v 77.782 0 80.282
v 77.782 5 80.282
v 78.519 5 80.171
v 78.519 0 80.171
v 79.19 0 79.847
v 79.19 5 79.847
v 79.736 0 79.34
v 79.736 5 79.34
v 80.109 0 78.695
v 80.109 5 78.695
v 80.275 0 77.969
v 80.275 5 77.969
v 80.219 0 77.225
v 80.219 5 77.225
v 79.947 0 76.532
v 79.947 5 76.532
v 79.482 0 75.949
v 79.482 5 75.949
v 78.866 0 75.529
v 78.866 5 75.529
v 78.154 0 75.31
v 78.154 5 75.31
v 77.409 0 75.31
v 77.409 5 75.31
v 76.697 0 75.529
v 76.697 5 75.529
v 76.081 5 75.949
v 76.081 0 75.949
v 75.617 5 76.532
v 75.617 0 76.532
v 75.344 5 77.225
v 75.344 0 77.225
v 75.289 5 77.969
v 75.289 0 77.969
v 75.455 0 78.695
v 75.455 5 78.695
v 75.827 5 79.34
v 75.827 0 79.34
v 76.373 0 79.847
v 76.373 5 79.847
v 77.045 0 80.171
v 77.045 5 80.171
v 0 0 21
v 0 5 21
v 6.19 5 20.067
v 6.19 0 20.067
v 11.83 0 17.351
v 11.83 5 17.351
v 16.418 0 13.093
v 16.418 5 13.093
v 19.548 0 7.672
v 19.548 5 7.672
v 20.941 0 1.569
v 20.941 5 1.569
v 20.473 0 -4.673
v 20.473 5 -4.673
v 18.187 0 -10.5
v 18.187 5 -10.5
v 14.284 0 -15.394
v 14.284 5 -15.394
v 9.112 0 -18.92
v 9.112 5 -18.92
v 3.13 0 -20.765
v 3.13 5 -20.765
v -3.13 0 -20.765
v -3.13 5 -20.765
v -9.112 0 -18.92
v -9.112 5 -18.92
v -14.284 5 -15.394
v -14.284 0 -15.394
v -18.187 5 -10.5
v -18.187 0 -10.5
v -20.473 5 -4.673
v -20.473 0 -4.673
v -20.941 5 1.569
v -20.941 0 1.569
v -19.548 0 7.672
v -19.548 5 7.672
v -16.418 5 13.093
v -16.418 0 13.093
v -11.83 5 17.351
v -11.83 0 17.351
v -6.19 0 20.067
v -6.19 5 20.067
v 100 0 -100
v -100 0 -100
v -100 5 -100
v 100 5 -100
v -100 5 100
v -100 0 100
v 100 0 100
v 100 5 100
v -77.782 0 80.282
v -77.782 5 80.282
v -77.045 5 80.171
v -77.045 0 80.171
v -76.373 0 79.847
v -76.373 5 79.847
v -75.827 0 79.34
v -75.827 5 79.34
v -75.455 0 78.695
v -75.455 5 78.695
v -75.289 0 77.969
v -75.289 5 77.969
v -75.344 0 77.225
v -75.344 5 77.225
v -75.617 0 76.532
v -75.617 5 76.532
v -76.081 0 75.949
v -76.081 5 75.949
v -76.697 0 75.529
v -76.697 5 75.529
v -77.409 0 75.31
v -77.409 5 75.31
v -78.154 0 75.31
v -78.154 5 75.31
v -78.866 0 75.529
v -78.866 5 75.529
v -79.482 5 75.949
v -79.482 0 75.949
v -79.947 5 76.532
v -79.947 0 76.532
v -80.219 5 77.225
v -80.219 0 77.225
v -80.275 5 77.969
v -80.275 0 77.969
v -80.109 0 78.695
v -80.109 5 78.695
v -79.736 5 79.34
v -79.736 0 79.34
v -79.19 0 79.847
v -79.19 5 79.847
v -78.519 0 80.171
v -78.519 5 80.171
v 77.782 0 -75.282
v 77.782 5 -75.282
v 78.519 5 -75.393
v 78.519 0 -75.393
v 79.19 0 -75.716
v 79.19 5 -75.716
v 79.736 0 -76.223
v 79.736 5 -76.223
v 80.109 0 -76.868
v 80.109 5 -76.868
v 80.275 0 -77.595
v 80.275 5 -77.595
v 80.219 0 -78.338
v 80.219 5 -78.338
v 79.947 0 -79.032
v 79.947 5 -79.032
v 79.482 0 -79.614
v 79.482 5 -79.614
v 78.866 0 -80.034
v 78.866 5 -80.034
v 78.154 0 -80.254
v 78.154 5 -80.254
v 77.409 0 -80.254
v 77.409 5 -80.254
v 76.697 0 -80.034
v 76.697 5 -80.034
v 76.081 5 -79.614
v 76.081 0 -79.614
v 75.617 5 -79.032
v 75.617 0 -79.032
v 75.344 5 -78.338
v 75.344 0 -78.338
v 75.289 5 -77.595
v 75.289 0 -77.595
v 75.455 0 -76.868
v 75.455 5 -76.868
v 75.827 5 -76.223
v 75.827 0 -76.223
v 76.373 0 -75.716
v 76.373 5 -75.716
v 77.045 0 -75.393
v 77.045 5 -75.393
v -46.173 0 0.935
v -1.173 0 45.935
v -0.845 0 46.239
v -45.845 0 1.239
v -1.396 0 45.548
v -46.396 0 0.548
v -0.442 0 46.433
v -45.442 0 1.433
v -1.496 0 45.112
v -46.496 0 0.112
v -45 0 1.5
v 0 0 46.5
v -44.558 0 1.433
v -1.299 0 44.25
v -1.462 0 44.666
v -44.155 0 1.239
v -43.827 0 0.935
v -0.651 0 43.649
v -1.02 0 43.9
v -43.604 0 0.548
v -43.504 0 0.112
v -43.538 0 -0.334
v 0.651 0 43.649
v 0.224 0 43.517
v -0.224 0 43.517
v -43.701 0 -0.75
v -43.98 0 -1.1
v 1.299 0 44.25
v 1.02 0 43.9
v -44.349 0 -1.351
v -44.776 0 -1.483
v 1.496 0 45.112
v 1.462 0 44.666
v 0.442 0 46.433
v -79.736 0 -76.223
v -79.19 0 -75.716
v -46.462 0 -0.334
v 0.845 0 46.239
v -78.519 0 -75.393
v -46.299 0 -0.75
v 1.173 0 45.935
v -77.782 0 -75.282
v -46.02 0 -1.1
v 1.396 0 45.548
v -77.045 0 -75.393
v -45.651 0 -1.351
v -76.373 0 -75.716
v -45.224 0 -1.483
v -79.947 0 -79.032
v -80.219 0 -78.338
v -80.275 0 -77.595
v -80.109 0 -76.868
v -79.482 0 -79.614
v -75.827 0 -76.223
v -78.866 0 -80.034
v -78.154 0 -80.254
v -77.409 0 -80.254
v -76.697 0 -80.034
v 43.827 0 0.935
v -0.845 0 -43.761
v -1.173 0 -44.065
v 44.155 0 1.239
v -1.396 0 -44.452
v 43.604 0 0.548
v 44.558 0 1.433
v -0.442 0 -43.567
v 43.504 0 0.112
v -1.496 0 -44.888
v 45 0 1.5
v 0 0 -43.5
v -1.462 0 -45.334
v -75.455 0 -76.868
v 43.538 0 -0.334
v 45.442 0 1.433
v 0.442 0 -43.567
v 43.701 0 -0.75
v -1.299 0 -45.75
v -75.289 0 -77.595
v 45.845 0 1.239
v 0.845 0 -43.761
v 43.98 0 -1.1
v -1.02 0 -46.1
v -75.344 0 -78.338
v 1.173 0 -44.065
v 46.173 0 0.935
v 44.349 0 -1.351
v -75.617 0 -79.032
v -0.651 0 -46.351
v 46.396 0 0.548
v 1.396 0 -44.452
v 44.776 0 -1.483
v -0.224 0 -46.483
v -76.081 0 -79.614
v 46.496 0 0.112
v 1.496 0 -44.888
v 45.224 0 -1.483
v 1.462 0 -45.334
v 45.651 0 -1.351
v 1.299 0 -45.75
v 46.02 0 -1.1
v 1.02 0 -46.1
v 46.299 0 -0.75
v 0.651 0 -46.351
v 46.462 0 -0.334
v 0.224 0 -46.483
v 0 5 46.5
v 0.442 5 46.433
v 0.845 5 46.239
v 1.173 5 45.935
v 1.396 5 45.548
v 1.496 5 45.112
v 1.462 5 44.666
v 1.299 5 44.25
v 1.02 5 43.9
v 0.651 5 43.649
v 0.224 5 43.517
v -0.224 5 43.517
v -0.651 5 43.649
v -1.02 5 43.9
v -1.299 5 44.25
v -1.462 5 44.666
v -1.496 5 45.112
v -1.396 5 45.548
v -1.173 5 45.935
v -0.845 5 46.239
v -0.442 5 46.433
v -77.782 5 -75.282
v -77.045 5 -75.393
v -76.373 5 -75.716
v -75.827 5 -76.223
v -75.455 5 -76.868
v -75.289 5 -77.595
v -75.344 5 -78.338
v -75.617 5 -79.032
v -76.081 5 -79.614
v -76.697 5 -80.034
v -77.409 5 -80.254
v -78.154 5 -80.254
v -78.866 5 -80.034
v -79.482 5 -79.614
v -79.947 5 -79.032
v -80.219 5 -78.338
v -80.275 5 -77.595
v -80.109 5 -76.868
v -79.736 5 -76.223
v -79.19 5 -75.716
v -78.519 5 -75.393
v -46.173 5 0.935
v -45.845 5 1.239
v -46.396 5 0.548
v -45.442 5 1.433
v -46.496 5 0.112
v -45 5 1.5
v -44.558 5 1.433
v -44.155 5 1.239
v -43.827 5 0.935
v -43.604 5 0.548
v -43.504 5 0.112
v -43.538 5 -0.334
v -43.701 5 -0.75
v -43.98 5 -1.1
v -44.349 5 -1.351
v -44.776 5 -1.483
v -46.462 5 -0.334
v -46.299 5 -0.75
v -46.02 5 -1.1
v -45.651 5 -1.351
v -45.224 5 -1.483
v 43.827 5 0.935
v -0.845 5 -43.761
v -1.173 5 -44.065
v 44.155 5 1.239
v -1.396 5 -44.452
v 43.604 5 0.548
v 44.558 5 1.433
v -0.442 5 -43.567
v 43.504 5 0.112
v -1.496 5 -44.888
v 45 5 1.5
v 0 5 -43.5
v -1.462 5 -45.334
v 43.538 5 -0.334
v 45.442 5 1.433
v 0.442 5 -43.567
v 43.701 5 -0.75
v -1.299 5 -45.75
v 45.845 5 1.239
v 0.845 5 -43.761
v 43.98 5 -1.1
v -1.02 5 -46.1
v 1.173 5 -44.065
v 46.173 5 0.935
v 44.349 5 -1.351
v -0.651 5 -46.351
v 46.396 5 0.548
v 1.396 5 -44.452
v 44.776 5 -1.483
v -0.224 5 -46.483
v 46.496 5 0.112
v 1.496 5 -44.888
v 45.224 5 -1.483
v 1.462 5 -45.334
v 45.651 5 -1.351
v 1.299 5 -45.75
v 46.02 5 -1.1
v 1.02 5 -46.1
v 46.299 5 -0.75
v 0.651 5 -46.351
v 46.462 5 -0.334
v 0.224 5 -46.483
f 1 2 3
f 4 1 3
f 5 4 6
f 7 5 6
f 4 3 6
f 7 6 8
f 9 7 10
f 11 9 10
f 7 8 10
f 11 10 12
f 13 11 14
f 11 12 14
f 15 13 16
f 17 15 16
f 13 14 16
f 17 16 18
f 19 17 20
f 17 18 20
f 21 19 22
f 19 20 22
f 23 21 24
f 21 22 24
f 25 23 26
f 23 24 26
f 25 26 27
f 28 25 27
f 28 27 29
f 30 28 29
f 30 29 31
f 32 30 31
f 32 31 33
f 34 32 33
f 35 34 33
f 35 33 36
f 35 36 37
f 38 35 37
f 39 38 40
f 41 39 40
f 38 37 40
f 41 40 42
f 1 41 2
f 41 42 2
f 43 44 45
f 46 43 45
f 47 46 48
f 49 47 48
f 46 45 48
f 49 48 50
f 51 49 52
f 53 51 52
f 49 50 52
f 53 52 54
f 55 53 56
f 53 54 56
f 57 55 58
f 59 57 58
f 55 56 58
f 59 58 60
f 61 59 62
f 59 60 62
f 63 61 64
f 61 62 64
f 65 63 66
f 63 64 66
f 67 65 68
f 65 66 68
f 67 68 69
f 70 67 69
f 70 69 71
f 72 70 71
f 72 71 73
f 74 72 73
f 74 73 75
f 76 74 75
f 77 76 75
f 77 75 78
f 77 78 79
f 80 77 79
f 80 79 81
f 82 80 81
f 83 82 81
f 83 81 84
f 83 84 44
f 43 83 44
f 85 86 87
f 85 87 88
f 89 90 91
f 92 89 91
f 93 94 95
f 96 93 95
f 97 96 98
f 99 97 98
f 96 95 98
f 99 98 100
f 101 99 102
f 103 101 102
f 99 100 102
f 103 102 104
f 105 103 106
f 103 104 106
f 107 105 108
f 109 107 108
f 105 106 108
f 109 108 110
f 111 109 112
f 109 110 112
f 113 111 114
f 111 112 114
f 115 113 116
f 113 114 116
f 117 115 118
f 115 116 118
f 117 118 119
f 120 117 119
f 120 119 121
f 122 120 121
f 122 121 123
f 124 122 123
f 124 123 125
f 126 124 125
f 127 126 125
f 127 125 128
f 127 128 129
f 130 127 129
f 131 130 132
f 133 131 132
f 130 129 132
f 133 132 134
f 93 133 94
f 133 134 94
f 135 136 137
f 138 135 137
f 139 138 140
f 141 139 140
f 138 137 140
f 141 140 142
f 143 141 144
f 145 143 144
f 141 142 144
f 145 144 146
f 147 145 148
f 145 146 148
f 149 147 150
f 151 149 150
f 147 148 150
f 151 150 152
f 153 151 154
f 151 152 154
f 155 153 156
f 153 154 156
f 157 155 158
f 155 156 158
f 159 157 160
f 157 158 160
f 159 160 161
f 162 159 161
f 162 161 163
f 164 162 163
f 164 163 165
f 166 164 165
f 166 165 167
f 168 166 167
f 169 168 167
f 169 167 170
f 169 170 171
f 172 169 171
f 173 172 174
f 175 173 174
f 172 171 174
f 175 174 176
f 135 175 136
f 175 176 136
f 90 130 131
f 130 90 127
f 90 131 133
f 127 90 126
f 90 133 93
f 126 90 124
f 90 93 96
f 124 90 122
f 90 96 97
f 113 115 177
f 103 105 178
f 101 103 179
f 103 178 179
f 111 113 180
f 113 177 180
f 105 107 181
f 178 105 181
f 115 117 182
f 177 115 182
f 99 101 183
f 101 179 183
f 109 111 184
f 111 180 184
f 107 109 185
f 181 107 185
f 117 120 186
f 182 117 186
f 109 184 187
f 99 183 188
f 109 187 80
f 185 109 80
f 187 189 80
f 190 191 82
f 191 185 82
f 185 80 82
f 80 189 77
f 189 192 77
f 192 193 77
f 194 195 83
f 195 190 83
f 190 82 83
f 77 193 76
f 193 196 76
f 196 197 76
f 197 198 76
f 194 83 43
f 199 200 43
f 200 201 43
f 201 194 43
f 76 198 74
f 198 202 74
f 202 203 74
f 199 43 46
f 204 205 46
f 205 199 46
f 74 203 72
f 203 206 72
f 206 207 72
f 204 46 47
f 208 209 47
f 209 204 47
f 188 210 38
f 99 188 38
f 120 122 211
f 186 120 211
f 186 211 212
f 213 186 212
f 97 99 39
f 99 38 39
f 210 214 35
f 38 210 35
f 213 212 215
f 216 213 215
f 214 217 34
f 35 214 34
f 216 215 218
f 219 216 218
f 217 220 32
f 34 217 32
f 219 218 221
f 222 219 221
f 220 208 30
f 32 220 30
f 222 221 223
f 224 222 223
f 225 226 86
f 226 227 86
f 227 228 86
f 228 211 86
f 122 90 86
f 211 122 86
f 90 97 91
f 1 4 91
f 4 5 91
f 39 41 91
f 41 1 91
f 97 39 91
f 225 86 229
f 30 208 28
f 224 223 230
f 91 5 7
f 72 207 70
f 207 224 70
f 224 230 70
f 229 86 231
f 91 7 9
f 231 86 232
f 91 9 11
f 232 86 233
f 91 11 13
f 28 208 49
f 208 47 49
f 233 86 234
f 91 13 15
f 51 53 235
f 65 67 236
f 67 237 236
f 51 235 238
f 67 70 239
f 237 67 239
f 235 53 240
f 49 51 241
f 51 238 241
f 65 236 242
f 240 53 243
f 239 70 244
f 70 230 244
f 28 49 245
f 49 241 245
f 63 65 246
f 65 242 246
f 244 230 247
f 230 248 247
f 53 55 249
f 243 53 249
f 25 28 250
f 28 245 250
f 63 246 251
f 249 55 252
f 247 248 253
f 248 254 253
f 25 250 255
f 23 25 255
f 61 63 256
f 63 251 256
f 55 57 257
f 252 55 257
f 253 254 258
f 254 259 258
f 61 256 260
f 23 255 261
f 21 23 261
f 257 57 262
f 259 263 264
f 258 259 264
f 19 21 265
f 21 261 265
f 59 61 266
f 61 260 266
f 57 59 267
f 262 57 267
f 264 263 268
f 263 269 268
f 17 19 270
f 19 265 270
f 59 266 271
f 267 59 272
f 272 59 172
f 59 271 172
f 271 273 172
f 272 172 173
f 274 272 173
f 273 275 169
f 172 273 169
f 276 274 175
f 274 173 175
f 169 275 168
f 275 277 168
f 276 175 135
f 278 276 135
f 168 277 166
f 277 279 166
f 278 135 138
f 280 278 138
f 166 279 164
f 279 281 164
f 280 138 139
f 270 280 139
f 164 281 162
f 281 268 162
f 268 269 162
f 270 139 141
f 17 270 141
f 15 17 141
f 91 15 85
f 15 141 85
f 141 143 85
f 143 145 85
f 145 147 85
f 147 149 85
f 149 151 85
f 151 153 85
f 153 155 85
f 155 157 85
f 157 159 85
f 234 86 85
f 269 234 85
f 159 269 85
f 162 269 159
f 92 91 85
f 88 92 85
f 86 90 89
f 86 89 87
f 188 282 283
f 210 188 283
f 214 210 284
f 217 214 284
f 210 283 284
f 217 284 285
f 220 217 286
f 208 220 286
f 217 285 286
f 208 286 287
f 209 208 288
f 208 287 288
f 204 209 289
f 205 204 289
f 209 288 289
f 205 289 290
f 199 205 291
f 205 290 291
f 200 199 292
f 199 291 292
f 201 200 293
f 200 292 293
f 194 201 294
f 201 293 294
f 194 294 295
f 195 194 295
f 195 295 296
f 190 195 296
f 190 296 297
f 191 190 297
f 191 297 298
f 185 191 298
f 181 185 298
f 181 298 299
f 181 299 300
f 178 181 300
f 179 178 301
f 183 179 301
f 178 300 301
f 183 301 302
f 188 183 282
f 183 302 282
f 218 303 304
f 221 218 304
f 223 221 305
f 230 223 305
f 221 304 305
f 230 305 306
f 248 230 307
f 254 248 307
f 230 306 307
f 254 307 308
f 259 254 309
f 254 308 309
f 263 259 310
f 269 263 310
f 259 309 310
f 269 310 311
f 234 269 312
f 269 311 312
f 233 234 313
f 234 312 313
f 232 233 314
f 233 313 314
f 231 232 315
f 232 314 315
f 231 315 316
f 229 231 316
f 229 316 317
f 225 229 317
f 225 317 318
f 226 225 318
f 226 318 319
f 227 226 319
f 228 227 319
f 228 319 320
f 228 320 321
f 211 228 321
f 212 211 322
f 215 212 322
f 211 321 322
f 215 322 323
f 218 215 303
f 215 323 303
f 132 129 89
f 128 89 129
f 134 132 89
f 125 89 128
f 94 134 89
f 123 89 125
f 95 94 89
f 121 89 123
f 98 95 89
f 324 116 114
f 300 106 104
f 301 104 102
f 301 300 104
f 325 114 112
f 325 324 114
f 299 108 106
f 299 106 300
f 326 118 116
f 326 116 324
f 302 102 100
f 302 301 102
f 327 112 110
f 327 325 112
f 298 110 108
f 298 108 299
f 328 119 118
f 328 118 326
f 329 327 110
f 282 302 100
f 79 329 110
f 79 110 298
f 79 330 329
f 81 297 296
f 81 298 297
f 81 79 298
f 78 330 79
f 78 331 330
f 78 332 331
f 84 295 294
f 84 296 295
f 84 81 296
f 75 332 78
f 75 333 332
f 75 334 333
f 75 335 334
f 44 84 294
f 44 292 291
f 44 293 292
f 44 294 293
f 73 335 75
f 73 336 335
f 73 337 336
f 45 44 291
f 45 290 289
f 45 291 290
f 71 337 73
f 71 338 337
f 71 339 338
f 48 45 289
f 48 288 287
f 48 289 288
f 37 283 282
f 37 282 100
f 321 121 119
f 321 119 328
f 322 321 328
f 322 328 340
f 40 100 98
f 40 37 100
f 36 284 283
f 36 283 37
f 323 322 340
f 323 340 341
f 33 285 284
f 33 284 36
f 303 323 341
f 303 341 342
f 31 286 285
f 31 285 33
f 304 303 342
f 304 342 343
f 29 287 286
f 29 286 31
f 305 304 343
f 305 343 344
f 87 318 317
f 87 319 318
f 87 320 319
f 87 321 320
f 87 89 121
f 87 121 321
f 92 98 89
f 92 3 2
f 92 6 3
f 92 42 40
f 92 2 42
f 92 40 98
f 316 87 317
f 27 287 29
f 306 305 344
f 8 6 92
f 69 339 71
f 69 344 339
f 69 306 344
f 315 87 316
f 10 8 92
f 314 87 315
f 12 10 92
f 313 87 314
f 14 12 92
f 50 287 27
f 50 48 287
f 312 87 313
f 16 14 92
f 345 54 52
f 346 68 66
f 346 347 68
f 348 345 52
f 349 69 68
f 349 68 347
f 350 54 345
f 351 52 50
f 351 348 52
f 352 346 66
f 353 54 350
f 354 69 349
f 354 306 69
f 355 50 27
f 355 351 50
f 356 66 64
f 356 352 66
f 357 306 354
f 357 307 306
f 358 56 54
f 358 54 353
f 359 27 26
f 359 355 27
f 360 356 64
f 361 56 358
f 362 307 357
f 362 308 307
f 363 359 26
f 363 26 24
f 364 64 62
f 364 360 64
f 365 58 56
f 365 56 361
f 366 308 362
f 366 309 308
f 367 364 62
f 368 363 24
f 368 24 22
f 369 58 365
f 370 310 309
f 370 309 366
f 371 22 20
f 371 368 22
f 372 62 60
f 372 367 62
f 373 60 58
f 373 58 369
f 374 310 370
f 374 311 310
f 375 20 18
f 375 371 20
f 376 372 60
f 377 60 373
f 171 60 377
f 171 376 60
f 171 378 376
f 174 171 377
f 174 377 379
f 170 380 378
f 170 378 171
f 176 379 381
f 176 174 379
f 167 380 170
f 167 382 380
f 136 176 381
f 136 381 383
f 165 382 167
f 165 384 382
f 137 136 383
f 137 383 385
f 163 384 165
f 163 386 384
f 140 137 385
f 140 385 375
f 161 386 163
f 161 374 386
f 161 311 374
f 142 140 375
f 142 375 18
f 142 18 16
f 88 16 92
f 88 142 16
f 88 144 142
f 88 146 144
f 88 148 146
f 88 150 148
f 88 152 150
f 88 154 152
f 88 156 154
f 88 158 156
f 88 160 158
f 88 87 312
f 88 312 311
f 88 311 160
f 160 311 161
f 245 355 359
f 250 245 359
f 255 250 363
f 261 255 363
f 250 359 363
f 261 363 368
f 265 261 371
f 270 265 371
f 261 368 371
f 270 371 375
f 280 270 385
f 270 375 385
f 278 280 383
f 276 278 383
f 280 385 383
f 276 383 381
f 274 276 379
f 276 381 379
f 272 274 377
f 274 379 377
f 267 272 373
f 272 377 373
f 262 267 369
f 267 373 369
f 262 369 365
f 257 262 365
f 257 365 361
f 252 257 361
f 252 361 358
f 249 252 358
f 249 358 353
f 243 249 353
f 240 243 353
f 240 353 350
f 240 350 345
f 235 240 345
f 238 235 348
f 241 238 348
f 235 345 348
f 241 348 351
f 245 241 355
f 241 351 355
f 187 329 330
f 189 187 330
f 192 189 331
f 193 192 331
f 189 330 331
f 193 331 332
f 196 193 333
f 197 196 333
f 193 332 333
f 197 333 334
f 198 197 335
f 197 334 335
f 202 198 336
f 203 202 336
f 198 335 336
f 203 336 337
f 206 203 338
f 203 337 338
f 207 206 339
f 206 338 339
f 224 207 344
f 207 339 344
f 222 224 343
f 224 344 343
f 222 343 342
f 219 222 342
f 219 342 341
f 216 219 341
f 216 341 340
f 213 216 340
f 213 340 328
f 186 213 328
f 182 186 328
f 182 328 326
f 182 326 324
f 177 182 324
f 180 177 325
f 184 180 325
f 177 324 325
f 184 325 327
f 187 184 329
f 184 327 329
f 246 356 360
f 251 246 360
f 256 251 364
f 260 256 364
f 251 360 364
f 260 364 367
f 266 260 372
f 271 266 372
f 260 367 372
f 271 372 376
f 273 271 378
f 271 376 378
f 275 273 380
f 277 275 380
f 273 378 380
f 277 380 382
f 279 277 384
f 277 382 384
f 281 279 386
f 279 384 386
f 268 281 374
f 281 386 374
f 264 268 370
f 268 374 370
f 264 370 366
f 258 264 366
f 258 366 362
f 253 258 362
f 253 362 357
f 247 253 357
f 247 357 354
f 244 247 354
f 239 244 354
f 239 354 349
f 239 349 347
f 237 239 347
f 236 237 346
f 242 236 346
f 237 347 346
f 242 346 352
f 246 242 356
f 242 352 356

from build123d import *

# Parameters (mm, degrees)
SKETCH1_W           = 200
SKETCH1_H           = 200
BOSS_EXTRUDE1_DEPTH = 5
SKETCH2_R           = 2.5
CUT_EXTRUDE1_DEPTH  = 5
SKETCH3_R           = 1.5
CUT_EXTRUDE2_DEPTH  = 5
SKETCH4_R           = 21
CUT_EXTRUDE3_DEPTH  = 7


with BuildPart() as part:
    # Sketch1 → Boss-Extrude1 (new body)
    with BuildSketch(Plane(origin=(0, 0, 0), x_dir=(1, 0, 0), z_dir=(0, 1, 0))):
        Rectangle(SKETCH1_W, SKETCH1_H)
    extrude(amount=BOSS_EXTRUDE1_DEPTH)

    # Sketch2 → Cut-Extrude1 (cut)
    with BuildSketch(Plane(origin=(0, 5, 0), x_dir=(1, 0, 0), z_dir=(0, 1, 0))):
        with Locations(Location((77.781745931, 77.781745931, 0), (0, 0, 270))):
            Circle(SKETCH2_R)
        with Locations(Location((77.781745931, -77.781745931, 0), (0, 0, 270))):
            Circle(SKETCH2_R)
        with Locations(Location((-77.781745931, -77.781745931, 0), (0, 0, 270))):
            Circle(SKETCH2_R)
        with Locations(Location((-77.781745931, 77.781745931, 0), (0, 0, 270))):
            Circle(SKETCH2_R)
    extrude(amount=-CUT_EXTRUDE1_DEPTH, mode=Mode.SUBTRACT)

    # Sketch3 → Cut-Extrude2 (cut)
    with BuildSketch(Plane(origin=(0, 5, 0), x_dir=(1, 0, 0), z_dir=(0, 1, 0))):
        with Locations(Location((0, -45, 0), (0, 0, 270))):
            Circle(SKETCH3_R)
        with Locations(Location((-45, 0, 0), (0, 0, 270))):
            Circle(SKETCH3_R)
        with Locations(Location((0, 45, 0), (0, 0, 270))):
            Circle(SKETCH3_R)
        with Locations(Location((45, 0, 0), (0, 0, 270))):
            Circle(SKETCH3_R)
    extrude(amount=-CUT_EXTRUDE2_DEPTH, mode=Mode.SUBTRACT)

    # Sketch4 → Cut-Extrude3 (cut)
    with BuildSketch(Plane(origin=(0, 5, 0), x_dir=(1, 0, 0), z_dir=(0, 1, 0))):
        with Locations(Location((0, 0, 0), (0, 0, 270))):
            Circle(SKETCH4_R)
    extrude(amount=-CUT_EXTRUDE3_DEPTH, mode=Mode.SUBTRACT)


solid = part.part
